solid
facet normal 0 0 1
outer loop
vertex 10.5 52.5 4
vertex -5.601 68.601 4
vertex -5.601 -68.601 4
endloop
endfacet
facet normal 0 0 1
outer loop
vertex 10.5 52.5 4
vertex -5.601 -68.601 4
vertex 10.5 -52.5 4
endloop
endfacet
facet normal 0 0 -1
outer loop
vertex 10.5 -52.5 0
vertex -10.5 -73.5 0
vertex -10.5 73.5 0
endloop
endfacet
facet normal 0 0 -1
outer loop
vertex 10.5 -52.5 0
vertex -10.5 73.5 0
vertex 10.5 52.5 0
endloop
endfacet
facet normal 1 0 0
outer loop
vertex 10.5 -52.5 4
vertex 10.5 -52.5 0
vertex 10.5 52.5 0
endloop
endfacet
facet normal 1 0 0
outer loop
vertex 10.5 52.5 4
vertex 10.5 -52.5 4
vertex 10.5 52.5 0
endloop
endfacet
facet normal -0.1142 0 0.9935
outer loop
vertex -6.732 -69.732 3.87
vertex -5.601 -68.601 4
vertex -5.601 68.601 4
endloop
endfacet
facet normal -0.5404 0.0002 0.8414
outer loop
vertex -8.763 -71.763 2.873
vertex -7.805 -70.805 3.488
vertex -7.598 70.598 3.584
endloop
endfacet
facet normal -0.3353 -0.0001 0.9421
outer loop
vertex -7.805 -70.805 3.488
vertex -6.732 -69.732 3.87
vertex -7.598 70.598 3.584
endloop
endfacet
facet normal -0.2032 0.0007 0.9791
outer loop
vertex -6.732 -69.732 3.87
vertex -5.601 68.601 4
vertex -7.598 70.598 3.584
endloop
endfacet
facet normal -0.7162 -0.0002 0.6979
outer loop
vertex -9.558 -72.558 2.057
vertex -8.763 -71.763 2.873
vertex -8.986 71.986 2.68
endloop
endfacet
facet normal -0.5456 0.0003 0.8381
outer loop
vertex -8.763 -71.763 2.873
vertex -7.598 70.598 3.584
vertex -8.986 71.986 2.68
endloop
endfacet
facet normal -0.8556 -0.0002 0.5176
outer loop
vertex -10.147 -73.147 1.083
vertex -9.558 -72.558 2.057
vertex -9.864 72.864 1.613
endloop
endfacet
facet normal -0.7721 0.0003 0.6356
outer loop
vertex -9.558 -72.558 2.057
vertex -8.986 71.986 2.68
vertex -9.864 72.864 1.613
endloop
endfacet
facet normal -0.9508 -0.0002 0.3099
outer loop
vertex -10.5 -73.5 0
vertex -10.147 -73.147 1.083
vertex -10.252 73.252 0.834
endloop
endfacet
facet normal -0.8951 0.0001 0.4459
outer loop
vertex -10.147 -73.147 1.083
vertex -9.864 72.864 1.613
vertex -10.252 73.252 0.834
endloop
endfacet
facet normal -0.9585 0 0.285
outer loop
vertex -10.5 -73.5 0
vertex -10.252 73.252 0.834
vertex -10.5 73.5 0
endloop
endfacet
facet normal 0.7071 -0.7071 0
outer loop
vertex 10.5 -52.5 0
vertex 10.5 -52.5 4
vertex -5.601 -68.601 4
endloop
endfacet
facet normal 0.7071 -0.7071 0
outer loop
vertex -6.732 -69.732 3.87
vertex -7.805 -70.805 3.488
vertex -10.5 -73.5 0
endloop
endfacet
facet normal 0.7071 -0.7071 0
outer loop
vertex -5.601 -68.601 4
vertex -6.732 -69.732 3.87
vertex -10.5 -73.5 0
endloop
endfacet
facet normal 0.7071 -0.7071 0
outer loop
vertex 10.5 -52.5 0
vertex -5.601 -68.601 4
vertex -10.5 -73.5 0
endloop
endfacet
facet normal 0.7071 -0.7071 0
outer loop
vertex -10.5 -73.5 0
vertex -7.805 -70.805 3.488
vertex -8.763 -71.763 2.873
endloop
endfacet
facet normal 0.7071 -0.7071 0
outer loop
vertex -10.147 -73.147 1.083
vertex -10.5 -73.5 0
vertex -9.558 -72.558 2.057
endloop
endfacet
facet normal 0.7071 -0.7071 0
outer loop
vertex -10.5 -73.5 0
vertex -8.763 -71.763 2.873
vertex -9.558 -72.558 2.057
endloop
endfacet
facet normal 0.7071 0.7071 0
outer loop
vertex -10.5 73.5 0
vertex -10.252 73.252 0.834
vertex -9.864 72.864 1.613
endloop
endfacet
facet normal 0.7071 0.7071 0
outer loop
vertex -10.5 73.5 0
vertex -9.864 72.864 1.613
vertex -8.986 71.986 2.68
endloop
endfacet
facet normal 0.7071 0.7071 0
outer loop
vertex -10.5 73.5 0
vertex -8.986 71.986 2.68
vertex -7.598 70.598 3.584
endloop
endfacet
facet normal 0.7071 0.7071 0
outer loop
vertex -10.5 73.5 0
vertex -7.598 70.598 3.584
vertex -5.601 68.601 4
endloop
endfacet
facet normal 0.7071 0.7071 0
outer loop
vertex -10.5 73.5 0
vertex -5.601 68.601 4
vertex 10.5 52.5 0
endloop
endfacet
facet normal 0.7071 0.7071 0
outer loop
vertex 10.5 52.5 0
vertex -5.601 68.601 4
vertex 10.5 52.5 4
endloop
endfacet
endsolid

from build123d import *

# Parameters (mm, degrees)
F0_W        = 21
F0_H        = 147
F1_DEPTH    = 4
F3_DEPTH    = 4.001
F4_T1_DEPTH = 171.4948974279


# Not quite as in the source:
# - a fillet or chamfer that OpenCascade refuses, or shapes differently, is made with other operations: its cross-section is extruded or revolved along the edge and cut away or added


with BuildPart() as f1:
    # F0 (on Top) → F1 (new body)
    with BuildSketch(Plane.XY):
        Rectangle(F0_W, F0_H)
    extrude(amount=F1_DEPTH)

    # F2 (on face) → F3 (cut, through all)
    with BuildSketch(Plane.XY.offset(4)):
        Polygon((10.5, 73.5), (-10.5, 73.5), (10.5, 52.5), align=None)
        Polygon((10.5, -52.5), (-10.5, -73.5), (10.5, -73.5), align=None)
    extrude(amount=-F3_DEPTH, mode=Mode.SUBTRACT)

    # F4: fillet of radius 5 on 1 edges, made by hand

    # F4_s2 → F4_t1 (cut)
    with BuildSketch(Plane.XZ.offset(-85.7474487139)):
        with BuildLine():
            ThreePointArc((-5.6010205144, 4), (-8.7632981746, 2.8729833462), (-10.5, 0))
            Line((-10.5, 0), (-10.5, 4))
            Line((-10.5, 4), (-5.6010205144, 4))
        make_face()
    extrude(amount=F4_T1_DEPTH, mode=Mode.SUBTRACT)


solid = f1.part
